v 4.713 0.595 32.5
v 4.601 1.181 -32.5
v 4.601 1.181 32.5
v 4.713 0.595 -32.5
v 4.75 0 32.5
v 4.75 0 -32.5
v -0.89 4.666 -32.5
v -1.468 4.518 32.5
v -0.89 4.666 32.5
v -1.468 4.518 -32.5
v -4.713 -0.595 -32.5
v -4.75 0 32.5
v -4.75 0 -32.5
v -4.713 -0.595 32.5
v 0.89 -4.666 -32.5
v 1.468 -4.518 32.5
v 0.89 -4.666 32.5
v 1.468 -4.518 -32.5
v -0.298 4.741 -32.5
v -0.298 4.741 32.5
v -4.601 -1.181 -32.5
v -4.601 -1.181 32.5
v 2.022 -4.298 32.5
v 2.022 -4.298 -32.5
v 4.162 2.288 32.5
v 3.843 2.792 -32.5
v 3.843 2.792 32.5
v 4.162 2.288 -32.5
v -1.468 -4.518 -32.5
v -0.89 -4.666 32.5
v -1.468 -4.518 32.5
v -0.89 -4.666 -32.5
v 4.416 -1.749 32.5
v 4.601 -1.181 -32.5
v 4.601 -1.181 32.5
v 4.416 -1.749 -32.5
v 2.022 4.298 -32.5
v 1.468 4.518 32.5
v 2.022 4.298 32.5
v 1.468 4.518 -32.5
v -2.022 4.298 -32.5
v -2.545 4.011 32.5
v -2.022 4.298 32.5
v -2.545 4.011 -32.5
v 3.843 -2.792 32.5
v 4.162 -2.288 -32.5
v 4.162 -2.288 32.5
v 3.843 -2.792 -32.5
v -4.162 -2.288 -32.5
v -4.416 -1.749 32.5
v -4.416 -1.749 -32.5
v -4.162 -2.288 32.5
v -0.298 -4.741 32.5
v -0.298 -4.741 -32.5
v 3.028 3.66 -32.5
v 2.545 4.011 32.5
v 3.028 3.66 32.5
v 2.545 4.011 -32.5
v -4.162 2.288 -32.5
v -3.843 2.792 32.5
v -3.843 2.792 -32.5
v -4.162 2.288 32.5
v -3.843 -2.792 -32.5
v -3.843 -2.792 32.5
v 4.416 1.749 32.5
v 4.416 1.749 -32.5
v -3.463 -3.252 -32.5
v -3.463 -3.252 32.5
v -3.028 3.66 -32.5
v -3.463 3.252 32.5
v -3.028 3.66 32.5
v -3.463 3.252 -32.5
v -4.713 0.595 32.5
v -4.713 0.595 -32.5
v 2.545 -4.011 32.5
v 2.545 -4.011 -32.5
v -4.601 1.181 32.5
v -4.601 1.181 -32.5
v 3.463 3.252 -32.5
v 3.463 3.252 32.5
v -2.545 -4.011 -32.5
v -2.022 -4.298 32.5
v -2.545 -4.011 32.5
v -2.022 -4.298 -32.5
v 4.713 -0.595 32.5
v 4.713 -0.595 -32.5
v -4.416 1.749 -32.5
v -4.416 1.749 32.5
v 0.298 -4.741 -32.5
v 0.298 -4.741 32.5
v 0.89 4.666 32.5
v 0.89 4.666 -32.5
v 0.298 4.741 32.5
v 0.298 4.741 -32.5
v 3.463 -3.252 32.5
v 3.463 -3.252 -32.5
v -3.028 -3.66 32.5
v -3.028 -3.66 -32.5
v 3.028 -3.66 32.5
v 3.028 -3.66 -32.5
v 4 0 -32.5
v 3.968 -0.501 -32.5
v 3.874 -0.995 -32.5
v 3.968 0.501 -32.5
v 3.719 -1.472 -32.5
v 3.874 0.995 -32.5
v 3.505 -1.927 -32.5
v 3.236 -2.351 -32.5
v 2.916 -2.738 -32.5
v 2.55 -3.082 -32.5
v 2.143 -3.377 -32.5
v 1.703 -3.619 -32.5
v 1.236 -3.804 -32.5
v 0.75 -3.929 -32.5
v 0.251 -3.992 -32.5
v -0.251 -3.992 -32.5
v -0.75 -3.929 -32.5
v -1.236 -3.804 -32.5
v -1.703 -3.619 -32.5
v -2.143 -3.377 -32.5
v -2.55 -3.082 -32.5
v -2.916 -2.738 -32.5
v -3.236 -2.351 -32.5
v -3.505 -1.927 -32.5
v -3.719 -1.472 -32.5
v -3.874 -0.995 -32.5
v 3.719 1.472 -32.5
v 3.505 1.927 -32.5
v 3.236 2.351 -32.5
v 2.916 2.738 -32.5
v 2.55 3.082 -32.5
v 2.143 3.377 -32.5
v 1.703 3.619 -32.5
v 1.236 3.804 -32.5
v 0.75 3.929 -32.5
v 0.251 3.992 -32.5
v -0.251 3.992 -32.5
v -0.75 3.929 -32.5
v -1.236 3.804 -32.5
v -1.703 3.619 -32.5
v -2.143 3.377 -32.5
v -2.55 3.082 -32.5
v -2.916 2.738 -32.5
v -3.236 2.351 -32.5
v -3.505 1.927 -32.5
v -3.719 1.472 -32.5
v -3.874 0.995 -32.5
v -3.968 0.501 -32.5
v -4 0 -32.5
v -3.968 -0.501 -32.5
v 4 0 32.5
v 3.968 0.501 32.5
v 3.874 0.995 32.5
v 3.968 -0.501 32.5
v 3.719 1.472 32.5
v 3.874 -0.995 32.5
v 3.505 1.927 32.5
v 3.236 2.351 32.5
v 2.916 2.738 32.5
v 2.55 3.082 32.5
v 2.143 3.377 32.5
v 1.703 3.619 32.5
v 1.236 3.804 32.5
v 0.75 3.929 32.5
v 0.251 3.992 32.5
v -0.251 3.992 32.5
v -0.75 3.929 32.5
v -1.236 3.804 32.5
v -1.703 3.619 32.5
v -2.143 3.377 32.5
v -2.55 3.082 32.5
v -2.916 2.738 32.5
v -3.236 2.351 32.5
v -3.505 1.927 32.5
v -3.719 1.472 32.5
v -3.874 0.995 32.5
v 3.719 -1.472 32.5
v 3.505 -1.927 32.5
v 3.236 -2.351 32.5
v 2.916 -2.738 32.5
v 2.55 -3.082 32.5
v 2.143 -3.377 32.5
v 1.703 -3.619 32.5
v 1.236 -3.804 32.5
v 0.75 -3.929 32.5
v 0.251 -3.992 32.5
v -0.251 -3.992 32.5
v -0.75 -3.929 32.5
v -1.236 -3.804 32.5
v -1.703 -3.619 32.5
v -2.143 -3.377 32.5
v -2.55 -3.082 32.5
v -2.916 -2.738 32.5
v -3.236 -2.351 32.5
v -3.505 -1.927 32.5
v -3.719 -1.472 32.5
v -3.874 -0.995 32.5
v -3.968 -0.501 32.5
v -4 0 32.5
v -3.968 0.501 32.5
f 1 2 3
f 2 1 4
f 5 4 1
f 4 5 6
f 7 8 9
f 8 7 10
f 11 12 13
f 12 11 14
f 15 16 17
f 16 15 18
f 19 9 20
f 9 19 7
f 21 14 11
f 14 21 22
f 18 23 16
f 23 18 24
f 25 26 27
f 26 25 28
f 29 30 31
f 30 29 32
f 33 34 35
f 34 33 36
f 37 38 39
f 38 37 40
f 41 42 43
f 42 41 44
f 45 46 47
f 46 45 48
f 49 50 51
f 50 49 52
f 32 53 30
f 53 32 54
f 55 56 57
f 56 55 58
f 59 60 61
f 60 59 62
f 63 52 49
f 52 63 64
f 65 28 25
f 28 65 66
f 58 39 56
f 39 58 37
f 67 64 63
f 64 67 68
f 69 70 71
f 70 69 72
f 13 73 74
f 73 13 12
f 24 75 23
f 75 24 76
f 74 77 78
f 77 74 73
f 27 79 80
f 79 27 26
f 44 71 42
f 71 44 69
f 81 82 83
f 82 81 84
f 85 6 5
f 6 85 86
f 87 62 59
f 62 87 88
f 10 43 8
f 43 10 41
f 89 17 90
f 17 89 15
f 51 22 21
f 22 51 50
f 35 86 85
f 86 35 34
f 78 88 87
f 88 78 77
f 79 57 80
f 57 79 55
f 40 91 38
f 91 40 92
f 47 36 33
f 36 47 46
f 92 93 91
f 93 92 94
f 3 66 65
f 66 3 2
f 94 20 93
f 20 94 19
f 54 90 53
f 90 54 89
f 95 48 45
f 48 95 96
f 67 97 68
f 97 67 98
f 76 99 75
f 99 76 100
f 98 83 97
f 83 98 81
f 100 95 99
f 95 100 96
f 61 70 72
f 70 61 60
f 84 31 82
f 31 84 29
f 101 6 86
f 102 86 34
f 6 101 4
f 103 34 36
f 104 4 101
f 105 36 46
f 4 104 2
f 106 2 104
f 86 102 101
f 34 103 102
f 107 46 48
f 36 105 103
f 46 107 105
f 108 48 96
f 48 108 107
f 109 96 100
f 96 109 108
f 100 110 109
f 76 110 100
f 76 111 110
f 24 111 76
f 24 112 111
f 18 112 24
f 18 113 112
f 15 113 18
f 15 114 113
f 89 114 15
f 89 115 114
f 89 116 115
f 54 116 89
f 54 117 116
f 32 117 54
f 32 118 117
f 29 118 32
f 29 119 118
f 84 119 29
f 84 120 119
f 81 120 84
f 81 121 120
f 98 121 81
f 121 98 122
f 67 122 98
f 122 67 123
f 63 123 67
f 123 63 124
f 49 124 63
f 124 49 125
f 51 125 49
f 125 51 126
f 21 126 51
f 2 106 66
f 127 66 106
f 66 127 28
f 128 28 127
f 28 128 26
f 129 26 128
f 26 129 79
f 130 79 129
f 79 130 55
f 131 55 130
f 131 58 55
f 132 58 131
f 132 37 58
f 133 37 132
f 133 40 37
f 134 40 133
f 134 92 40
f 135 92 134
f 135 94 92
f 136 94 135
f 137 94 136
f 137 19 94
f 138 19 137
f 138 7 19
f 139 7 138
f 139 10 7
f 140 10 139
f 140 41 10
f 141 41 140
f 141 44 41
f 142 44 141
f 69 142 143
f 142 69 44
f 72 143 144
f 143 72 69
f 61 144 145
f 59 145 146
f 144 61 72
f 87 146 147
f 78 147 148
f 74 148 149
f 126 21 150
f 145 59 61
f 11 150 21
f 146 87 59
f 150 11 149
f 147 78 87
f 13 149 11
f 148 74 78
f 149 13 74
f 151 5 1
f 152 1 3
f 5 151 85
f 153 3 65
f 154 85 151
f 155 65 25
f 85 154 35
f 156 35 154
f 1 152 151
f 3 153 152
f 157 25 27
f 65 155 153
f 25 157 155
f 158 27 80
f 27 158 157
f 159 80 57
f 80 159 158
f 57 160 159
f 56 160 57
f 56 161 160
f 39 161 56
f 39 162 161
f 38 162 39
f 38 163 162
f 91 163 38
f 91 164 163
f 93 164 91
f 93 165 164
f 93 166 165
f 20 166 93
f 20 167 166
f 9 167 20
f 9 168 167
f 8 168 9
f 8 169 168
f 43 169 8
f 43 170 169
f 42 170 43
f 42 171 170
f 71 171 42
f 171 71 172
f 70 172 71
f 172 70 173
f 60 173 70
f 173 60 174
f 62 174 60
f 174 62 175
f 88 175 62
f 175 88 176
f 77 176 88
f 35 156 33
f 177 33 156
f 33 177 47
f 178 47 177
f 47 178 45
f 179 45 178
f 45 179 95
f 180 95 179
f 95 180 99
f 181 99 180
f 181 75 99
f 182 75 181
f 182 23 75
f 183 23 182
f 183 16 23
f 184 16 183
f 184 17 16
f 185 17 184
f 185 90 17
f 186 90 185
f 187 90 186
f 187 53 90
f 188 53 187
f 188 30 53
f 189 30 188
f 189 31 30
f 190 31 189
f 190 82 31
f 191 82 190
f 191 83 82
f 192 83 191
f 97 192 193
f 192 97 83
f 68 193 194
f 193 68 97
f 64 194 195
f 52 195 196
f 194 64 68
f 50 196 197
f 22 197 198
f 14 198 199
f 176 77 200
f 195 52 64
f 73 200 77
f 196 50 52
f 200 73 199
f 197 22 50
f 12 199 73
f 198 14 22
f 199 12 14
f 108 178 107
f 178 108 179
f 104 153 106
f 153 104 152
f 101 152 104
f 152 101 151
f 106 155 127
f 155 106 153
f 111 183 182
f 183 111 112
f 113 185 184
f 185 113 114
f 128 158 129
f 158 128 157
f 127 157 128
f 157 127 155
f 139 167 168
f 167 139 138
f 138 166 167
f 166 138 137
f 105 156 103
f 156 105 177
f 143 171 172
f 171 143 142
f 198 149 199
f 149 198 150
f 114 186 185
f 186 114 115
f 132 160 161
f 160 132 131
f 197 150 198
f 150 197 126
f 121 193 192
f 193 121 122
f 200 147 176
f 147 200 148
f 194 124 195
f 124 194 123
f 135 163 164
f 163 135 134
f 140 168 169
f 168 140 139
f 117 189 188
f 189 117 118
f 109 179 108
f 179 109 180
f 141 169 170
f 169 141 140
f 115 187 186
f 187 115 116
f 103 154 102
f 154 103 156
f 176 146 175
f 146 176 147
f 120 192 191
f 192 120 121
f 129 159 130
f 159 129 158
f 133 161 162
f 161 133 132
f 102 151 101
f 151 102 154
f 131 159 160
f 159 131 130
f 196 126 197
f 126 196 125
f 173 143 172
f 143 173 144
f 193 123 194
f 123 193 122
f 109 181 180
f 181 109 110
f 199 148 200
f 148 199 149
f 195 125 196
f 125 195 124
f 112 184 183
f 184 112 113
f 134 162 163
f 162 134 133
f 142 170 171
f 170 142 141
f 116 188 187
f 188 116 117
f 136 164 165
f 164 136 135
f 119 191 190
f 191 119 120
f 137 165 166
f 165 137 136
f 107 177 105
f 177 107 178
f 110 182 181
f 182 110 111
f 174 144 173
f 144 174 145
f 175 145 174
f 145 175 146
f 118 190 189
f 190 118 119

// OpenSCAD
$fn = 50;


difference() {
	union() {
		translate(v = [0, 0, -32.5000000000]) {
			cylinder(h = 65, r = 4.7500000000);
		}
	}
	union() {
		translate(v = [0, 0, -100.0000000000]) {
			cylinder(h = 200, r = 4.0000000000);
		}
	}
}
